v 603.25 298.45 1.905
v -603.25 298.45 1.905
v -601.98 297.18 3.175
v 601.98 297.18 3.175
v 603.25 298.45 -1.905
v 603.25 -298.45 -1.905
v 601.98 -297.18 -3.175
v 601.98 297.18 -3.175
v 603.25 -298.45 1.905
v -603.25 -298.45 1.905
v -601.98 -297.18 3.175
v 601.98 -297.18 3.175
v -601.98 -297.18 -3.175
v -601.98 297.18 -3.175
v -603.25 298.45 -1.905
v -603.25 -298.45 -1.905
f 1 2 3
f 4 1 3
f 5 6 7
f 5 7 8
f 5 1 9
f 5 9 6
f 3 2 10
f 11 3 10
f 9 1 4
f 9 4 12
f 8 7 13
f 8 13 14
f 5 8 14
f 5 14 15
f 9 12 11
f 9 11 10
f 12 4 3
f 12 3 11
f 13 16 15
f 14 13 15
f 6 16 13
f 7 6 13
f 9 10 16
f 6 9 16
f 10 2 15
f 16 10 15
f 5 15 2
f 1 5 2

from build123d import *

# Parameters (mm, degrees)
BOSS_EXTRUDE1_DEPTH      = 603.25
BOSS_EXTRUDE1_DEPTH_BACK = 603.25
CHAMFER1_SIZE            = 1.27


with BuildPart() as part:
    # Sketch1 → Boss-Extrude1 (new body, two sides)
    with BuildSketch(Plane(origin=(0, 0, 0), x_dir=(0, 0, -1), z_dir=(1, 0, 0))) as boss_extrude1_sk:
        Polygon((3.175, -297.18), (3.175, 297.18), (1.905, 298.45), (-1.905, 298.45), (-3.175, 297.18), (-3.175, -297.18), (-1.905, -298.45), (1.905, -298.45), align=None)
    extrude(amount=BOSS_EXTRUDE1_DEPTH)
    extrude(boss_extrude1_sk.sketch, amount=-BOSS_EXTRUDE1_DEPTH_BACK)

    # Chamfer1
    chamfer1_edges = [part.edges().sort_by_distance(p)[0] for p in [
        (-603.25, 0, -3.175),
        (-603.25, 0, 3.175),
        (603.25, 0, -3.175),
        (603.25, 0, 3.175),
    ]]
    chamfer(chamfer1_edges, length=CHAMFER1_SIZE)


solid = part.part
